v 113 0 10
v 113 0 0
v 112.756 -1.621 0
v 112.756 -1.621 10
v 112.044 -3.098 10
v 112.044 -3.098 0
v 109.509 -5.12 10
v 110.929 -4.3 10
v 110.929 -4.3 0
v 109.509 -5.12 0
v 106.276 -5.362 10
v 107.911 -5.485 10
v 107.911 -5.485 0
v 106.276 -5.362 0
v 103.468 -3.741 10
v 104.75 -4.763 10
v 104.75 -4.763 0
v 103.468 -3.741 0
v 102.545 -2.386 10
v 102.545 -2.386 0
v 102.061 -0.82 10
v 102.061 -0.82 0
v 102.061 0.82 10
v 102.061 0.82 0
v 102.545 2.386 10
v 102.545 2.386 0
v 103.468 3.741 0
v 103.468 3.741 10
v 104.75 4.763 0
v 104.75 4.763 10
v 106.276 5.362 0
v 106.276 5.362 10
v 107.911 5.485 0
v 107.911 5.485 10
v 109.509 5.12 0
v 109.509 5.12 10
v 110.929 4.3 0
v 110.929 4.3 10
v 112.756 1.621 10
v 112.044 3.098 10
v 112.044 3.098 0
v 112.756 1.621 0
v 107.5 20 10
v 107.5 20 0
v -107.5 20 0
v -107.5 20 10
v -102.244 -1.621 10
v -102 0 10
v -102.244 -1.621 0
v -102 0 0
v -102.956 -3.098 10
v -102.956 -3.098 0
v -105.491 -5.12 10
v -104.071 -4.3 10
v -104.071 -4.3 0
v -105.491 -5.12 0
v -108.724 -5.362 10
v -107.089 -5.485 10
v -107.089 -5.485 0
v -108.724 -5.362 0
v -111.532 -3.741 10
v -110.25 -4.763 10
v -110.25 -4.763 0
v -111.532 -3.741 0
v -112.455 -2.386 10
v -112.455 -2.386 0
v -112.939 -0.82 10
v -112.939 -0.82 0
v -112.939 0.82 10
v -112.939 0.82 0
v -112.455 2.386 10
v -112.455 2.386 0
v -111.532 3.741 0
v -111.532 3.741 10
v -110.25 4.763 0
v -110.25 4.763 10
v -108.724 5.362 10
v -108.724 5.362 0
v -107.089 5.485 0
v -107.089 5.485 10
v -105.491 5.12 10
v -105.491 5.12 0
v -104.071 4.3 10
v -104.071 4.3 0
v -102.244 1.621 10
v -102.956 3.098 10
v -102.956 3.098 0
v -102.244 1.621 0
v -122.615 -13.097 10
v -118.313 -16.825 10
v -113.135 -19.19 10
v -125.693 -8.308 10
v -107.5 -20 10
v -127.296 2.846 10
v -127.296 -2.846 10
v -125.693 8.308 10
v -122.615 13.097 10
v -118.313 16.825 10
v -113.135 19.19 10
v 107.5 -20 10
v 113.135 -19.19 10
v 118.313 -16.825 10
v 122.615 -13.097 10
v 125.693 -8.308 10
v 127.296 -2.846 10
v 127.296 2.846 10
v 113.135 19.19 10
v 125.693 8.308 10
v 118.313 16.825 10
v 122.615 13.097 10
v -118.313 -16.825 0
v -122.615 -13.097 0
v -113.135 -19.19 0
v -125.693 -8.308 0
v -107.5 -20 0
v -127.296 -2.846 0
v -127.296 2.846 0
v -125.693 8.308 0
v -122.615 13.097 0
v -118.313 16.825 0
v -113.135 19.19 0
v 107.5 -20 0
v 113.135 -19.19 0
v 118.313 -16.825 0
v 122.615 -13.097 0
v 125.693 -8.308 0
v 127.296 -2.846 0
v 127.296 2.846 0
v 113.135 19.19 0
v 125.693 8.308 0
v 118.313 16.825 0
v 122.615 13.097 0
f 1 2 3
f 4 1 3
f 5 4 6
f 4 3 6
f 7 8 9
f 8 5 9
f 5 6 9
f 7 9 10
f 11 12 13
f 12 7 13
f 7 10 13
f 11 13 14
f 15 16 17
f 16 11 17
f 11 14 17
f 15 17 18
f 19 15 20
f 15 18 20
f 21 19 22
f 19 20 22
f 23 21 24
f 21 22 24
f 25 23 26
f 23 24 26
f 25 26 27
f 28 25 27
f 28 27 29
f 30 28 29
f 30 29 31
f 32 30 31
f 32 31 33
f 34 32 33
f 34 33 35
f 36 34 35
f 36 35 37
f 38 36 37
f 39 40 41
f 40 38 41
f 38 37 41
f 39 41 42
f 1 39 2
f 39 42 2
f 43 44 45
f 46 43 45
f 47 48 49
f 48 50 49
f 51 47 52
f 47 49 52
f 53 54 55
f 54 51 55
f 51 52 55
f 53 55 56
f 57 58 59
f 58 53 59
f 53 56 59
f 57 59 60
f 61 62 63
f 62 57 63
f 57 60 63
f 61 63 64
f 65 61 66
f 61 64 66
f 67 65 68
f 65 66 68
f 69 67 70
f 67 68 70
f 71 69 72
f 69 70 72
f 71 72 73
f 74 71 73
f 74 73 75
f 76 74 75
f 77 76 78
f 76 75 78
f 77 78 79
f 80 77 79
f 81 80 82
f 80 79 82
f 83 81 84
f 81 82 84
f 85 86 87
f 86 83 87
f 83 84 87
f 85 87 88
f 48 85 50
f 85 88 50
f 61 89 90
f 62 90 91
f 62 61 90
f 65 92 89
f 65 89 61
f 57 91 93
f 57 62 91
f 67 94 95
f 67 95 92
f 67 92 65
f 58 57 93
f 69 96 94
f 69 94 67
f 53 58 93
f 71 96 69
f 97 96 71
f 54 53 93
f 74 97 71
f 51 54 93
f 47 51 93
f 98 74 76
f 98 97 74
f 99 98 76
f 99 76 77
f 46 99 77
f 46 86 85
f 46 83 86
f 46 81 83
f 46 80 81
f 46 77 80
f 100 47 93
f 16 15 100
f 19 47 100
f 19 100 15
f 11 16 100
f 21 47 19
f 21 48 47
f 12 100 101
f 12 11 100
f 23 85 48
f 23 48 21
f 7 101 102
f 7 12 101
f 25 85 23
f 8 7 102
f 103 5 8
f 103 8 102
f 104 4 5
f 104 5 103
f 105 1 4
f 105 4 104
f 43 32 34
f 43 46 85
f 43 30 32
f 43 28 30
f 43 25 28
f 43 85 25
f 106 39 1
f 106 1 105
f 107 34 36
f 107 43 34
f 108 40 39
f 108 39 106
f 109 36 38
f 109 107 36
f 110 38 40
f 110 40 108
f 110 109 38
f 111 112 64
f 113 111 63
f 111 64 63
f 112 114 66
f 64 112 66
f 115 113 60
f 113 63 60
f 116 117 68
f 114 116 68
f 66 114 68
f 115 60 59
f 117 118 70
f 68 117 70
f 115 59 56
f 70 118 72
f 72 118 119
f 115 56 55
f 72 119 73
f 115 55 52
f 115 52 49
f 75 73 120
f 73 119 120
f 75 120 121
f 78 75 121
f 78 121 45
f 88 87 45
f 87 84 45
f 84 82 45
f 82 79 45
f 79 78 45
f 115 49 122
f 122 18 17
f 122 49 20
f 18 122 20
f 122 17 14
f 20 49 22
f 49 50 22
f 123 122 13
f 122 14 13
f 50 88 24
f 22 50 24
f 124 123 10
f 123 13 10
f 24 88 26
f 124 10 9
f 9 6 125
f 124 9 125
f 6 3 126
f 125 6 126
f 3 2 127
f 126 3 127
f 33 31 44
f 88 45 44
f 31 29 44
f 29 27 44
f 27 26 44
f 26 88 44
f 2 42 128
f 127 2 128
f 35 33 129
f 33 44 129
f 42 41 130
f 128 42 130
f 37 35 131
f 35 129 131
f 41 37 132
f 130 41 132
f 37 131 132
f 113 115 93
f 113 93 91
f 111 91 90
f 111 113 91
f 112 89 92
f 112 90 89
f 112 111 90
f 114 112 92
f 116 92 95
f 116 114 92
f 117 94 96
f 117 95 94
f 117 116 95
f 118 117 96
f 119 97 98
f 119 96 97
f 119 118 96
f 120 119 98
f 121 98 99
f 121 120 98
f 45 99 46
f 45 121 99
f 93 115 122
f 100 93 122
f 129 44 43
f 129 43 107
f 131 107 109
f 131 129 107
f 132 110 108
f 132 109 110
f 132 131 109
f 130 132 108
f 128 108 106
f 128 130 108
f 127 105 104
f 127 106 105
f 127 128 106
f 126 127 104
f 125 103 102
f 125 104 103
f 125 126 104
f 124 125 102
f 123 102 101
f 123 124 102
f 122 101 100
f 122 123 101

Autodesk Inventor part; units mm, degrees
ref_plane "YZ Plane" through (0, 0, 0) normal (1, 0, 0) x (0, 1, 0)
ref_plane "XZ Plane" through (0, 0, 0) normal (0, 1, 0) x (-1, 0, 0)
ref_plane "XY Plane" through (0, 0, 0) normal (0, 0, 1) x (1, 0, 0)
sketch "Sketch4" plane through (0, 0, 0) normal (0, 0, 1) x (1, 0, 0)
  line L0 (107.5, 20) -> (-107.5, 20)
  line L1 (-107.5, -20) -> (107.5, -20)
  line L2 (107.5, -20) -> (-107.5, 20) construction
  line L3 (107.5, 20) -> (-107.5, -20) construction
  circle A0 centre (-107.5, 0) radius 5.5
  arc A1 (-107.5, 20) -> (-107.5, -20) centre (-107.5, 0) ccw
  circle A2 centre (107.5, 0) radius 5.5
  arc A3 (107.5, -20) -> (107.5, 20) centre (107.5, 0) ccw
  point P0 (0, 0)
  dimension "d20" = 40
  dimension "d21" = 215
  dimension "d22" = 11
  dimension "d23" = 11
extrude "Extrusion3" add sketch "Sketch4" along normal blind 10
properties part number "Eslabon"
